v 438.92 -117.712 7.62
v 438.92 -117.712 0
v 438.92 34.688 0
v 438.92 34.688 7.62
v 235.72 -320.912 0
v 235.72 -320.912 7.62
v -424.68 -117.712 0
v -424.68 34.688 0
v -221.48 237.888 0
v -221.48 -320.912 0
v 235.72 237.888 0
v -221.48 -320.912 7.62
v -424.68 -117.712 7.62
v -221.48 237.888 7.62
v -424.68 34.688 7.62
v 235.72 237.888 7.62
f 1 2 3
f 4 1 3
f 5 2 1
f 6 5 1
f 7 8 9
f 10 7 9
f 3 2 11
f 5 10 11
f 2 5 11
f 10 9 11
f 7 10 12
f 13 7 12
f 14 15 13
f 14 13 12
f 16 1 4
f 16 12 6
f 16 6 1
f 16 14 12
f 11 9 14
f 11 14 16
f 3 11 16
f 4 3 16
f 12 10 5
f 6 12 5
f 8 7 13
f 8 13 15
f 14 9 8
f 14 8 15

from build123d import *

# Parameters (mm, degrees)
SKETCH1_W           = 863.6
SKETCH1_H           = 558.8
BOSS_EXTRUDE1_DEPTH = 7.62
CHAMFER1_SIZE       = 203.2
CHAMFER2_SIZE       = 203.2
CHAMFER3_SIZE       = 203.2
CHAMFER4_SIZE       = 203.2


with BuildPart() as part:
    # Sketch1 → Boss-Extrude1 (new body)
    with BuildSketch(Plane.XY):
        with Locations((7.119883608, -41.512124151)):
            Rectangle(SKETCH1_W, SKETCH1_H)
    extrude(amount=BOSS_EXTRUDE1_DEPTH)

    # Chamfer1
    chamfer1_edges = [part.edges().sort_by_distance(p)[0] for p in [
        (-424.680116392, 237.887875849, 3.81),
    ]]
    chamfer(chamfer1_edges, length=CHAMFER1_SIZE)

    # Chamfer2
    chamfer2_edges = [part.edges().sort_by_distance(p)[0] for p in [
        (-424.680116392, -320.912124151, 3.81),
    ]]
    chamfer(chamfer2_edges, length=CHAMFER2_SIZE)

    # Chamfer3
    chamfer3_edges = [part.edges().sort_by_distance(p)[0] for p in [
        (438.919883608, -320.912124151, 3.81),
    ]]
    chamfer(chamfer3_edges, length=CHAMFER3_SIZE)

    # Chamfer4
    chamfer4_edges = [part.edges().sort_by_distance(p)[0] for p in [
        (438.919883608, 237.887875849, 3.81),
    ]]
    chamfer(chamfer4_edges, length=CHAMFER4_SIZE)


solid = part.part
